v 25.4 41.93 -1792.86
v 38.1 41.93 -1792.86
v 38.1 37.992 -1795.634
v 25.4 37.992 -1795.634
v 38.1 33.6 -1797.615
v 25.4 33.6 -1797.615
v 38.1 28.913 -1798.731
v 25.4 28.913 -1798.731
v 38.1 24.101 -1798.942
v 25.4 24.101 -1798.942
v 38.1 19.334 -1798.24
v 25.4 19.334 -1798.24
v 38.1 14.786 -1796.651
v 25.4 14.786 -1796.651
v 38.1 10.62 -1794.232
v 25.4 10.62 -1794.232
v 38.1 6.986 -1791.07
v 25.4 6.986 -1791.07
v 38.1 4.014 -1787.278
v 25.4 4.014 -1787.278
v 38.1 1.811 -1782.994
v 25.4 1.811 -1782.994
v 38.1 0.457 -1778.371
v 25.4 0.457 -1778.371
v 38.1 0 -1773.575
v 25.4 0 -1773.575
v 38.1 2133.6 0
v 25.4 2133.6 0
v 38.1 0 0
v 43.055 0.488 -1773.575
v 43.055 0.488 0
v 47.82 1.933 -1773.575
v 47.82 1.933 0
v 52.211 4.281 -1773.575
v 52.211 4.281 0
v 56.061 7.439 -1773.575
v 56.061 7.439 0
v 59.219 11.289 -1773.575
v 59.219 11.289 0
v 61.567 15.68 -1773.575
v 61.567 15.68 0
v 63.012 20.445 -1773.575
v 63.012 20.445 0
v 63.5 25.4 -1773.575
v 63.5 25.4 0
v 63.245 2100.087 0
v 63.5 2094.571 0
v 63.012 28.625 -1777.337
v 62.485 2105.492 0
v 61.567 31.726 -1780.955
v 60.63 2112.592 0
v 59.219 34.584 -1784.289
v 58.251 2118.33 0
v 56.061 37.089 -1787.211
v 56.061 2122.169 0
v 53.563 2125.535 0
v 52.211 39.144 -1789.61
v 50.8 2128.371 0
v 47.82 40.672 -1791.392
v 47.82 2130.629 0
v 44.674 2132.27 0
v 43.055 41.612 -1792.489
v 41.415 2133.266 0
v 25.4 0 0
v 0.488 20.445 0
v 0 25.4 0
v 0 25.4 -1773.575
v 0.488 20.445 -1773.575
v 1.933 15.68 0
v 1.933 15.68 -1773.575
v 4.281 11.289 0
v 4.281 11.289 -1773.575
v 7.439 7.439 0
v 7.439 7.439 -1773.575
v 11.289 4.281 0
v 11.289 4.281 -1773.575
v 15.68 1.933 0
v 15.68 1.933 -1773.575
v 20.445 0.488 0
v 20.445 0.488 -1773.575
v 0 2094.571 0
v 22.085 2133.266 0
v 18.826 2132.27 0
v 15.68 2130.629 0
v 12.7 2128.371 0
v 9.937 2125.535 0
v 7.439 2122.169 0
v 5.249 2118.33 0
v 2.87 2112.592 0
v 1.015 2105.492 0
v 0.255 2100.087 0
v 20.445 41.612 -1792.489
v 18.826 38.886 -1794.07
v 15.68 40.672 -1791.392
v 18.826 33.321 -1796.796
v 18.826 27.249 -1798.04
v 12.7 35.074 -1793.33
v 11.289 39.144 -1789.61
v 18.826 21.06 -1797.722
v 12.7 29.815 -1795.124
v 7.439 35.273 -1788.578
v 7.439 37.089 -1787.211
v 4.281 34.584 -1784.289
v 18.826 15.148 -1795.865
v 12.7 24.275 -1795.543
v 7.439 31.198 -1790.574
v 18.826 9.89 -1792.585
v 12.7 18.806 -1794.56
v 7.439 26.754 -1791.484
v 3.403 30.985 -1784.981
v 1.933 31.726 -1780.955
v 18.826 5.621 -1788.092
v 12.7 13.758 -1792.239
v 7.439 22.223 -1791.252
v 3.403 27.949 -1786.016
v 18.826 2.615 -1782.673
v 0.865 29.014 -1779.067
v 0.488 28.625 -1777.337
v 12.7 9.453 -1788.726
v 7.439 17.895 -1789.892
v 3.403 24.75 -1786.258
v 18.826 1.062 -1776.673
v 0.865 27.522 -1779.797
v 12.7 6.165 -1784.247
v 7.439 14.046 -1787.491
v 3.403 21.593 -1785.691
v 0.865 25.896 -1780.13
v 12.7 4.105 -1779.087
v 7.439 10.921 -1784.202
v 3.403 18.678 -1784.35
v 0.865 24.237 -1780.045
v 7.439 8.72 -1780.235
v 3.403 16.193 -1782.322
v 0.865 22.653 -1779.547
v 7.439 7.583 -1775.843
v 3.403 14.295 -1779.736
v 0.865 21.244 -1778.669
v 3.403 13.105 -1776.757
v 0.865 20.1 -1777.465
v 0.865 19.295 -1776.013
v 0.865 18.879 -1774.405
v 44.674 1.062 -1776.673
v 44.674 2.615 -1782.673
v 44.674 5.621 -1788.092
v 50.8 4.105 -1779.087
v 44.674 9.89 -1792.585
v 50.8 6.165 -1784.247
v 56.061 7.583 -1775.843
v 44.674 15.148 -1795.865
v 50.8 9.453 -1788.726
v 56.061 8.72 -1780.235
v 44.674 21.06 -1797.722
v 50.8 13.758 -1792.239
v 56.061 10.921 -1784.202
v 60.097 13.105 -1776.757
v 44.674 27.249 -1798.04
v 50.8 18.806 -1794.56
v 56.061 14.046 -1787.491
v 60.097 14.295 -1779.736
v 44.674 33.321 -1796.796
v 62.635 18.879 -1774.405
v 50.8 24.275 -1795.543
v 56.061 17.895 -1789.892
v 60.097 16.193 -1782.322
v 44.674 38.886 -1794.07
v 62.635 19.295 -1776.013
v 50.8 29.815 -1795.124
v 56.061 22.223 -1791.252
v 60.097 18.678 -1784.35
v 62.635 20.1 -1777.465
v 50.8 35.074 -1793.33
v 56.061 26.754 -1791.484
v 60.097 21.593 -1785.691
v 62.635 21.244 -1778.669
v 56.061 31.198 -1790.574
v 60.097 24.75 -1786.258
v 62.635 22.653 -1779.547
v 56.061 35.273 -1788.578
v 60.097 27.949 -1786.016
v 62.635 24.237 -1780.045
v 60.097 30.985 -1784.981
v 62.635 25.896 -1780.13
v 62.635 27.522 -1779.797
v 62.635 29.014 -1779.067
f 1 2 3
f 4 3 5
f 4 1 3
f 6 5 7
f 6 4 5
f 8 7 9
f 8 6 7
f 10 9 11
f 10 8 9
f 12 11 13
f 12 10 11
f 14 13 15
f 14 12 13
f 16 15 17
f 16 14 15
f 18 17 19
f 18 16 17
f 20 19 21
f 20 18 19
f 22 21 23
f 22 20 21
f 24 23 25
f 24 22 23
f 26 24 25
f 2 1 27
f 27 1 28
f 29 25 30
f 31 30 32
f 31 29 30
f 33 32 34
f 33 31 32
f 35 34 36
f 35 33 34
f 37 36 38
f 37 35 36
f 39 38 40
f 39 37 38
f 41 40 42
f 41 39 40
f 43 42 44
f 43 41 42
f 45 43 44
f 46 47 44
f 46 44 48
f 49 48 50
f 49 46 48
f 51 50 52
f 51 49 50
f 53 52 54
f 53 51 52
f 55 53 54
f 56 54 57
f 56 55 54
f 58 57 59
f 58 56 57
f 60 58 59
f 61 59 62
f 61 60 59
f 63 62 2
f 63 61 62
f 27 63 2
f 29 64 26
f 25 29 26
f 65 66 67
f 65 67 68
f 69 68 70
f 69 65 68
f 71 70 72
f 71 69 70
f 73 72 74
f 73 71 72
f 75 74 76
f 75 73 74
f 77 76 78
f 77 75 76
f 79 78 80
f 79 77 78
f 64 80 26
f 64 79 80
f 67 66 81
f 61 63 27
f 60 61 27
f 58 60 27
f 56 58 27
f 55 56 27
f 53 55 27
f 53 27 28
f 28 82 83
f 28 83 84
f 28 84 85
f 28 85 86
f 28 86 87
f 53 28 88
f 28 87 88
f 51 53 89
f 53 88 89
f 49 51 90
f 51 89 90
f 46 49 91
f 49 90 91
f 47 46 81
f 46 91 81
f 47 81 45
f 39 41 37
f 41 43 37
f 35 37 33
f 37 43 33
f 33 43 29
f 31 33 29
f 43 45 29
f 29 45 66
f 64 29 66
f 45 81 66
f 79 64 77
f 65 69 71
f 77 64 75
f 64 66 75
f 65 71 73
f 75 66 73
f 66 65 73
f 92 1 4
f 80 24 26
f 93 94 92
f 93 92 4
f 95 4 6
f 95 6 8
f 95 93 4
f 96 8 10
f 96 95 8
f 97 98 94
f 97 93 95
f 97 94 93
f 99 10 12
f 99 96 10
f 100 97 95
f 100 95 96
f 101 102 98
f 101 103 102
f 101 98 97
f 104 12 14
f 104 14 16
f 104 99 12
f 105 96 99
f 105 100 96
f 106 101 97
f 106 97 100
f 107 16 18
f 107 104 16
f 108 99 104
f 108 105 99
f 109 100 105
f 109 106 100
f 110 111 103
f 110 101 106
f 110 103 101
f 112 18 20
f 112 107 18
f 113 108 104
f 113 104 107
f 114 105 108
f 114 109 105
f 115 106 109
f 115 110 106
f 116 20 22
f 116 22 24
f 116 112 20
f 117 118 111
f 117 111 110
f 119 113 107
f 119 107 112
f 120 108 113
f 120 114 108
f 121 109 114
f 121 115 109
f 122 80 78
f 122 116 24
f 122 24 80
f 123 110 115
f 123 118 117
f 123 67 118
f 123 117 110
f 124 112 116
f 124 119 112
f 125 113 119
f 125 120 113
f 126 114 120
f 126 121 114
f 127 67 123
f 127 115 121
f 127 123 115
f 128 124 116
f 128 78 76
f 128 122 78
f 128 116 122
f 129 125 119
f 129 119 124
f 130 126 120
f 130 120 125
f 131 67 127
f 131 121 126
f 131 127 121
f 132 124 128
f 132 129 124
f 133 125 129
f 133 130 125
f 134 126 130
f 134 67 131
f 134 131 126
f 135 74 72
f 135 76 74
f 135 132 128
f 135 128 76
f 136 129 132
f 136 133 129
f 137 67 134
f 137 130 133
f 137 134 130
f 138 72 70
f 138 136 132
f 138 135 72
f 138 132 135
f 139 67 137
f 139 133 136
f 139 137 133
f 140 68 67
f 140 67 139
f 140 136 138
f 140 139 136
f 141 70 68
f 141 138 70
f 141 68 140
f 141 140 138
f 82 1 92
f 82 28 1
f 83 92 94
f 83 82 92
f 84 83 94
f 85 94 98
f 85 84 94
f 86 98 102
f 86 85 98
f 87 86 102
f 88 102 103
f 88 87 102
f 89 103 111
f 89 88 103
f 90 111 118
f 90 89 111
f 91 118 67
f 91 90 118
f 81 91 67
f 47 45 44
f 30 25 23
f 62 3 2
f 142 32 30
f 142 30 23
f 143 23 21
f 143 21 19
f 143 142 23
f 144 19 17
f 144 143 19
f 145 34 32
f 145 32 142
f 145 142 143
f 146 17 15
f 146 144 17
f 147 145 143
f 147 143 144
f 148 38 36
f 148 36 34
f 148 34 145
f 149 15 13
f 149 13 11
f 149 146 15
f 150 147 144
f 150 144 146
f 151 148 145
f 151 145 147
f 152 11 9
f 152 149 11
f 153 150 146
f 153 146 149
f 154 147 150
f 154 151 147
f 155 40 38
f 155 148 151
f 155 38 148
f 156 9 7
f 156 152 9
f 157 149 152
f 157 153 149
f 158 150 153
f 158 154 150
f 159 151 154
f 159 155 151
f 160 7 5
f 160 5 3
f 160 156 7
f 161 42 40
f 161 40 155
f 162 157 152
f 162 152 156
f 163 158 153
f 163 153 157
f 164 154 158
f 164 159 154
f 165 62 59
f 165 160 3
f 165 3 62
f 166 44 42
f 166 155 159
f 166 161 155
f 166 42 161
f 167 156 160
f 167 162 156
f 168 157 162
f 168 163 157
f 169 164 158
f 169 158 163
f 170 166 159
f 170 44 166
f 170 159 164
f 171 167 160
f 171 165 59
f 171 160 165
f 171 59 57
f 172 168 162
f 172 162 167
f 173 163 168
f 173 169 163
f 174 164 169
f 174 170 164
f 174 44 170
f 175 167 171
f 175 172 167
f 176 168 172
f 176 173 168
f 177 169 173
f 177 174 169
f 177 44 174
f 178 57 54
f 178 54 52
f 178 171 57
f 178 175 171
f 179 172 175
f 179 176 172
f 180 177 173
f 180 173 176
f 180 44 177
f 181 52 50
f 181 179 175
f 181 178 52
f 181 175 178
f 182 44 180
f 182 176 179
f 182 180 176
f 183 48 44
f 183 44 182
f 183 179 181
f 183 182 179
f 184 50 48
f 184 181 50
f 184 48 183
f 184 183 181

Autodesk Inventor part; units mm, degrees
ref_plane "XZ Plane" through (0, 0, 0) normal (0, 1, 0) x (-1, 0, 0)
ref_plane "XY Plane" through (0, 0, 0) normal (0, 0, 1) x (1, 0, 0)
sketch "Sketch1" plane through (0, 0, 0) normal (1, 0, 0) x (0, 1, 0)
  line L0 (0, 0) -> (0, -1828.8)
  line L1 (0, -1828.8) -> (2133.6, 0)
  line L2 (2133.6, 0) -> (0, 0)
  dimension "d2" = 1828.8
  dimension "d3" = 2133.6
extrude "Extrusion1" add sketch "Sketch1" along normal blind 63.5
ref_plane "Work Plane1" through (31.75, 0, 0) normal (1, 0, 0) x (0, 1, 0)
fillet "Fillet4" radius 25.4 1 edges at (63.5, 1066.8, -914.4)
fillet "Fillet5" radius 25.4 1 edges at (0, 1066.8, -914.4)
fillet "Fillet6" radius 25.4 5 edges at (56.0605, 0, -1819.0016) (31.75, 0, -1828.8) (7.4395, 0, -1819.0016) (0, 0, -897.6731) (63.5, 0, -897.6731)
properties part number "RedSail-ver1-1111-2021"
